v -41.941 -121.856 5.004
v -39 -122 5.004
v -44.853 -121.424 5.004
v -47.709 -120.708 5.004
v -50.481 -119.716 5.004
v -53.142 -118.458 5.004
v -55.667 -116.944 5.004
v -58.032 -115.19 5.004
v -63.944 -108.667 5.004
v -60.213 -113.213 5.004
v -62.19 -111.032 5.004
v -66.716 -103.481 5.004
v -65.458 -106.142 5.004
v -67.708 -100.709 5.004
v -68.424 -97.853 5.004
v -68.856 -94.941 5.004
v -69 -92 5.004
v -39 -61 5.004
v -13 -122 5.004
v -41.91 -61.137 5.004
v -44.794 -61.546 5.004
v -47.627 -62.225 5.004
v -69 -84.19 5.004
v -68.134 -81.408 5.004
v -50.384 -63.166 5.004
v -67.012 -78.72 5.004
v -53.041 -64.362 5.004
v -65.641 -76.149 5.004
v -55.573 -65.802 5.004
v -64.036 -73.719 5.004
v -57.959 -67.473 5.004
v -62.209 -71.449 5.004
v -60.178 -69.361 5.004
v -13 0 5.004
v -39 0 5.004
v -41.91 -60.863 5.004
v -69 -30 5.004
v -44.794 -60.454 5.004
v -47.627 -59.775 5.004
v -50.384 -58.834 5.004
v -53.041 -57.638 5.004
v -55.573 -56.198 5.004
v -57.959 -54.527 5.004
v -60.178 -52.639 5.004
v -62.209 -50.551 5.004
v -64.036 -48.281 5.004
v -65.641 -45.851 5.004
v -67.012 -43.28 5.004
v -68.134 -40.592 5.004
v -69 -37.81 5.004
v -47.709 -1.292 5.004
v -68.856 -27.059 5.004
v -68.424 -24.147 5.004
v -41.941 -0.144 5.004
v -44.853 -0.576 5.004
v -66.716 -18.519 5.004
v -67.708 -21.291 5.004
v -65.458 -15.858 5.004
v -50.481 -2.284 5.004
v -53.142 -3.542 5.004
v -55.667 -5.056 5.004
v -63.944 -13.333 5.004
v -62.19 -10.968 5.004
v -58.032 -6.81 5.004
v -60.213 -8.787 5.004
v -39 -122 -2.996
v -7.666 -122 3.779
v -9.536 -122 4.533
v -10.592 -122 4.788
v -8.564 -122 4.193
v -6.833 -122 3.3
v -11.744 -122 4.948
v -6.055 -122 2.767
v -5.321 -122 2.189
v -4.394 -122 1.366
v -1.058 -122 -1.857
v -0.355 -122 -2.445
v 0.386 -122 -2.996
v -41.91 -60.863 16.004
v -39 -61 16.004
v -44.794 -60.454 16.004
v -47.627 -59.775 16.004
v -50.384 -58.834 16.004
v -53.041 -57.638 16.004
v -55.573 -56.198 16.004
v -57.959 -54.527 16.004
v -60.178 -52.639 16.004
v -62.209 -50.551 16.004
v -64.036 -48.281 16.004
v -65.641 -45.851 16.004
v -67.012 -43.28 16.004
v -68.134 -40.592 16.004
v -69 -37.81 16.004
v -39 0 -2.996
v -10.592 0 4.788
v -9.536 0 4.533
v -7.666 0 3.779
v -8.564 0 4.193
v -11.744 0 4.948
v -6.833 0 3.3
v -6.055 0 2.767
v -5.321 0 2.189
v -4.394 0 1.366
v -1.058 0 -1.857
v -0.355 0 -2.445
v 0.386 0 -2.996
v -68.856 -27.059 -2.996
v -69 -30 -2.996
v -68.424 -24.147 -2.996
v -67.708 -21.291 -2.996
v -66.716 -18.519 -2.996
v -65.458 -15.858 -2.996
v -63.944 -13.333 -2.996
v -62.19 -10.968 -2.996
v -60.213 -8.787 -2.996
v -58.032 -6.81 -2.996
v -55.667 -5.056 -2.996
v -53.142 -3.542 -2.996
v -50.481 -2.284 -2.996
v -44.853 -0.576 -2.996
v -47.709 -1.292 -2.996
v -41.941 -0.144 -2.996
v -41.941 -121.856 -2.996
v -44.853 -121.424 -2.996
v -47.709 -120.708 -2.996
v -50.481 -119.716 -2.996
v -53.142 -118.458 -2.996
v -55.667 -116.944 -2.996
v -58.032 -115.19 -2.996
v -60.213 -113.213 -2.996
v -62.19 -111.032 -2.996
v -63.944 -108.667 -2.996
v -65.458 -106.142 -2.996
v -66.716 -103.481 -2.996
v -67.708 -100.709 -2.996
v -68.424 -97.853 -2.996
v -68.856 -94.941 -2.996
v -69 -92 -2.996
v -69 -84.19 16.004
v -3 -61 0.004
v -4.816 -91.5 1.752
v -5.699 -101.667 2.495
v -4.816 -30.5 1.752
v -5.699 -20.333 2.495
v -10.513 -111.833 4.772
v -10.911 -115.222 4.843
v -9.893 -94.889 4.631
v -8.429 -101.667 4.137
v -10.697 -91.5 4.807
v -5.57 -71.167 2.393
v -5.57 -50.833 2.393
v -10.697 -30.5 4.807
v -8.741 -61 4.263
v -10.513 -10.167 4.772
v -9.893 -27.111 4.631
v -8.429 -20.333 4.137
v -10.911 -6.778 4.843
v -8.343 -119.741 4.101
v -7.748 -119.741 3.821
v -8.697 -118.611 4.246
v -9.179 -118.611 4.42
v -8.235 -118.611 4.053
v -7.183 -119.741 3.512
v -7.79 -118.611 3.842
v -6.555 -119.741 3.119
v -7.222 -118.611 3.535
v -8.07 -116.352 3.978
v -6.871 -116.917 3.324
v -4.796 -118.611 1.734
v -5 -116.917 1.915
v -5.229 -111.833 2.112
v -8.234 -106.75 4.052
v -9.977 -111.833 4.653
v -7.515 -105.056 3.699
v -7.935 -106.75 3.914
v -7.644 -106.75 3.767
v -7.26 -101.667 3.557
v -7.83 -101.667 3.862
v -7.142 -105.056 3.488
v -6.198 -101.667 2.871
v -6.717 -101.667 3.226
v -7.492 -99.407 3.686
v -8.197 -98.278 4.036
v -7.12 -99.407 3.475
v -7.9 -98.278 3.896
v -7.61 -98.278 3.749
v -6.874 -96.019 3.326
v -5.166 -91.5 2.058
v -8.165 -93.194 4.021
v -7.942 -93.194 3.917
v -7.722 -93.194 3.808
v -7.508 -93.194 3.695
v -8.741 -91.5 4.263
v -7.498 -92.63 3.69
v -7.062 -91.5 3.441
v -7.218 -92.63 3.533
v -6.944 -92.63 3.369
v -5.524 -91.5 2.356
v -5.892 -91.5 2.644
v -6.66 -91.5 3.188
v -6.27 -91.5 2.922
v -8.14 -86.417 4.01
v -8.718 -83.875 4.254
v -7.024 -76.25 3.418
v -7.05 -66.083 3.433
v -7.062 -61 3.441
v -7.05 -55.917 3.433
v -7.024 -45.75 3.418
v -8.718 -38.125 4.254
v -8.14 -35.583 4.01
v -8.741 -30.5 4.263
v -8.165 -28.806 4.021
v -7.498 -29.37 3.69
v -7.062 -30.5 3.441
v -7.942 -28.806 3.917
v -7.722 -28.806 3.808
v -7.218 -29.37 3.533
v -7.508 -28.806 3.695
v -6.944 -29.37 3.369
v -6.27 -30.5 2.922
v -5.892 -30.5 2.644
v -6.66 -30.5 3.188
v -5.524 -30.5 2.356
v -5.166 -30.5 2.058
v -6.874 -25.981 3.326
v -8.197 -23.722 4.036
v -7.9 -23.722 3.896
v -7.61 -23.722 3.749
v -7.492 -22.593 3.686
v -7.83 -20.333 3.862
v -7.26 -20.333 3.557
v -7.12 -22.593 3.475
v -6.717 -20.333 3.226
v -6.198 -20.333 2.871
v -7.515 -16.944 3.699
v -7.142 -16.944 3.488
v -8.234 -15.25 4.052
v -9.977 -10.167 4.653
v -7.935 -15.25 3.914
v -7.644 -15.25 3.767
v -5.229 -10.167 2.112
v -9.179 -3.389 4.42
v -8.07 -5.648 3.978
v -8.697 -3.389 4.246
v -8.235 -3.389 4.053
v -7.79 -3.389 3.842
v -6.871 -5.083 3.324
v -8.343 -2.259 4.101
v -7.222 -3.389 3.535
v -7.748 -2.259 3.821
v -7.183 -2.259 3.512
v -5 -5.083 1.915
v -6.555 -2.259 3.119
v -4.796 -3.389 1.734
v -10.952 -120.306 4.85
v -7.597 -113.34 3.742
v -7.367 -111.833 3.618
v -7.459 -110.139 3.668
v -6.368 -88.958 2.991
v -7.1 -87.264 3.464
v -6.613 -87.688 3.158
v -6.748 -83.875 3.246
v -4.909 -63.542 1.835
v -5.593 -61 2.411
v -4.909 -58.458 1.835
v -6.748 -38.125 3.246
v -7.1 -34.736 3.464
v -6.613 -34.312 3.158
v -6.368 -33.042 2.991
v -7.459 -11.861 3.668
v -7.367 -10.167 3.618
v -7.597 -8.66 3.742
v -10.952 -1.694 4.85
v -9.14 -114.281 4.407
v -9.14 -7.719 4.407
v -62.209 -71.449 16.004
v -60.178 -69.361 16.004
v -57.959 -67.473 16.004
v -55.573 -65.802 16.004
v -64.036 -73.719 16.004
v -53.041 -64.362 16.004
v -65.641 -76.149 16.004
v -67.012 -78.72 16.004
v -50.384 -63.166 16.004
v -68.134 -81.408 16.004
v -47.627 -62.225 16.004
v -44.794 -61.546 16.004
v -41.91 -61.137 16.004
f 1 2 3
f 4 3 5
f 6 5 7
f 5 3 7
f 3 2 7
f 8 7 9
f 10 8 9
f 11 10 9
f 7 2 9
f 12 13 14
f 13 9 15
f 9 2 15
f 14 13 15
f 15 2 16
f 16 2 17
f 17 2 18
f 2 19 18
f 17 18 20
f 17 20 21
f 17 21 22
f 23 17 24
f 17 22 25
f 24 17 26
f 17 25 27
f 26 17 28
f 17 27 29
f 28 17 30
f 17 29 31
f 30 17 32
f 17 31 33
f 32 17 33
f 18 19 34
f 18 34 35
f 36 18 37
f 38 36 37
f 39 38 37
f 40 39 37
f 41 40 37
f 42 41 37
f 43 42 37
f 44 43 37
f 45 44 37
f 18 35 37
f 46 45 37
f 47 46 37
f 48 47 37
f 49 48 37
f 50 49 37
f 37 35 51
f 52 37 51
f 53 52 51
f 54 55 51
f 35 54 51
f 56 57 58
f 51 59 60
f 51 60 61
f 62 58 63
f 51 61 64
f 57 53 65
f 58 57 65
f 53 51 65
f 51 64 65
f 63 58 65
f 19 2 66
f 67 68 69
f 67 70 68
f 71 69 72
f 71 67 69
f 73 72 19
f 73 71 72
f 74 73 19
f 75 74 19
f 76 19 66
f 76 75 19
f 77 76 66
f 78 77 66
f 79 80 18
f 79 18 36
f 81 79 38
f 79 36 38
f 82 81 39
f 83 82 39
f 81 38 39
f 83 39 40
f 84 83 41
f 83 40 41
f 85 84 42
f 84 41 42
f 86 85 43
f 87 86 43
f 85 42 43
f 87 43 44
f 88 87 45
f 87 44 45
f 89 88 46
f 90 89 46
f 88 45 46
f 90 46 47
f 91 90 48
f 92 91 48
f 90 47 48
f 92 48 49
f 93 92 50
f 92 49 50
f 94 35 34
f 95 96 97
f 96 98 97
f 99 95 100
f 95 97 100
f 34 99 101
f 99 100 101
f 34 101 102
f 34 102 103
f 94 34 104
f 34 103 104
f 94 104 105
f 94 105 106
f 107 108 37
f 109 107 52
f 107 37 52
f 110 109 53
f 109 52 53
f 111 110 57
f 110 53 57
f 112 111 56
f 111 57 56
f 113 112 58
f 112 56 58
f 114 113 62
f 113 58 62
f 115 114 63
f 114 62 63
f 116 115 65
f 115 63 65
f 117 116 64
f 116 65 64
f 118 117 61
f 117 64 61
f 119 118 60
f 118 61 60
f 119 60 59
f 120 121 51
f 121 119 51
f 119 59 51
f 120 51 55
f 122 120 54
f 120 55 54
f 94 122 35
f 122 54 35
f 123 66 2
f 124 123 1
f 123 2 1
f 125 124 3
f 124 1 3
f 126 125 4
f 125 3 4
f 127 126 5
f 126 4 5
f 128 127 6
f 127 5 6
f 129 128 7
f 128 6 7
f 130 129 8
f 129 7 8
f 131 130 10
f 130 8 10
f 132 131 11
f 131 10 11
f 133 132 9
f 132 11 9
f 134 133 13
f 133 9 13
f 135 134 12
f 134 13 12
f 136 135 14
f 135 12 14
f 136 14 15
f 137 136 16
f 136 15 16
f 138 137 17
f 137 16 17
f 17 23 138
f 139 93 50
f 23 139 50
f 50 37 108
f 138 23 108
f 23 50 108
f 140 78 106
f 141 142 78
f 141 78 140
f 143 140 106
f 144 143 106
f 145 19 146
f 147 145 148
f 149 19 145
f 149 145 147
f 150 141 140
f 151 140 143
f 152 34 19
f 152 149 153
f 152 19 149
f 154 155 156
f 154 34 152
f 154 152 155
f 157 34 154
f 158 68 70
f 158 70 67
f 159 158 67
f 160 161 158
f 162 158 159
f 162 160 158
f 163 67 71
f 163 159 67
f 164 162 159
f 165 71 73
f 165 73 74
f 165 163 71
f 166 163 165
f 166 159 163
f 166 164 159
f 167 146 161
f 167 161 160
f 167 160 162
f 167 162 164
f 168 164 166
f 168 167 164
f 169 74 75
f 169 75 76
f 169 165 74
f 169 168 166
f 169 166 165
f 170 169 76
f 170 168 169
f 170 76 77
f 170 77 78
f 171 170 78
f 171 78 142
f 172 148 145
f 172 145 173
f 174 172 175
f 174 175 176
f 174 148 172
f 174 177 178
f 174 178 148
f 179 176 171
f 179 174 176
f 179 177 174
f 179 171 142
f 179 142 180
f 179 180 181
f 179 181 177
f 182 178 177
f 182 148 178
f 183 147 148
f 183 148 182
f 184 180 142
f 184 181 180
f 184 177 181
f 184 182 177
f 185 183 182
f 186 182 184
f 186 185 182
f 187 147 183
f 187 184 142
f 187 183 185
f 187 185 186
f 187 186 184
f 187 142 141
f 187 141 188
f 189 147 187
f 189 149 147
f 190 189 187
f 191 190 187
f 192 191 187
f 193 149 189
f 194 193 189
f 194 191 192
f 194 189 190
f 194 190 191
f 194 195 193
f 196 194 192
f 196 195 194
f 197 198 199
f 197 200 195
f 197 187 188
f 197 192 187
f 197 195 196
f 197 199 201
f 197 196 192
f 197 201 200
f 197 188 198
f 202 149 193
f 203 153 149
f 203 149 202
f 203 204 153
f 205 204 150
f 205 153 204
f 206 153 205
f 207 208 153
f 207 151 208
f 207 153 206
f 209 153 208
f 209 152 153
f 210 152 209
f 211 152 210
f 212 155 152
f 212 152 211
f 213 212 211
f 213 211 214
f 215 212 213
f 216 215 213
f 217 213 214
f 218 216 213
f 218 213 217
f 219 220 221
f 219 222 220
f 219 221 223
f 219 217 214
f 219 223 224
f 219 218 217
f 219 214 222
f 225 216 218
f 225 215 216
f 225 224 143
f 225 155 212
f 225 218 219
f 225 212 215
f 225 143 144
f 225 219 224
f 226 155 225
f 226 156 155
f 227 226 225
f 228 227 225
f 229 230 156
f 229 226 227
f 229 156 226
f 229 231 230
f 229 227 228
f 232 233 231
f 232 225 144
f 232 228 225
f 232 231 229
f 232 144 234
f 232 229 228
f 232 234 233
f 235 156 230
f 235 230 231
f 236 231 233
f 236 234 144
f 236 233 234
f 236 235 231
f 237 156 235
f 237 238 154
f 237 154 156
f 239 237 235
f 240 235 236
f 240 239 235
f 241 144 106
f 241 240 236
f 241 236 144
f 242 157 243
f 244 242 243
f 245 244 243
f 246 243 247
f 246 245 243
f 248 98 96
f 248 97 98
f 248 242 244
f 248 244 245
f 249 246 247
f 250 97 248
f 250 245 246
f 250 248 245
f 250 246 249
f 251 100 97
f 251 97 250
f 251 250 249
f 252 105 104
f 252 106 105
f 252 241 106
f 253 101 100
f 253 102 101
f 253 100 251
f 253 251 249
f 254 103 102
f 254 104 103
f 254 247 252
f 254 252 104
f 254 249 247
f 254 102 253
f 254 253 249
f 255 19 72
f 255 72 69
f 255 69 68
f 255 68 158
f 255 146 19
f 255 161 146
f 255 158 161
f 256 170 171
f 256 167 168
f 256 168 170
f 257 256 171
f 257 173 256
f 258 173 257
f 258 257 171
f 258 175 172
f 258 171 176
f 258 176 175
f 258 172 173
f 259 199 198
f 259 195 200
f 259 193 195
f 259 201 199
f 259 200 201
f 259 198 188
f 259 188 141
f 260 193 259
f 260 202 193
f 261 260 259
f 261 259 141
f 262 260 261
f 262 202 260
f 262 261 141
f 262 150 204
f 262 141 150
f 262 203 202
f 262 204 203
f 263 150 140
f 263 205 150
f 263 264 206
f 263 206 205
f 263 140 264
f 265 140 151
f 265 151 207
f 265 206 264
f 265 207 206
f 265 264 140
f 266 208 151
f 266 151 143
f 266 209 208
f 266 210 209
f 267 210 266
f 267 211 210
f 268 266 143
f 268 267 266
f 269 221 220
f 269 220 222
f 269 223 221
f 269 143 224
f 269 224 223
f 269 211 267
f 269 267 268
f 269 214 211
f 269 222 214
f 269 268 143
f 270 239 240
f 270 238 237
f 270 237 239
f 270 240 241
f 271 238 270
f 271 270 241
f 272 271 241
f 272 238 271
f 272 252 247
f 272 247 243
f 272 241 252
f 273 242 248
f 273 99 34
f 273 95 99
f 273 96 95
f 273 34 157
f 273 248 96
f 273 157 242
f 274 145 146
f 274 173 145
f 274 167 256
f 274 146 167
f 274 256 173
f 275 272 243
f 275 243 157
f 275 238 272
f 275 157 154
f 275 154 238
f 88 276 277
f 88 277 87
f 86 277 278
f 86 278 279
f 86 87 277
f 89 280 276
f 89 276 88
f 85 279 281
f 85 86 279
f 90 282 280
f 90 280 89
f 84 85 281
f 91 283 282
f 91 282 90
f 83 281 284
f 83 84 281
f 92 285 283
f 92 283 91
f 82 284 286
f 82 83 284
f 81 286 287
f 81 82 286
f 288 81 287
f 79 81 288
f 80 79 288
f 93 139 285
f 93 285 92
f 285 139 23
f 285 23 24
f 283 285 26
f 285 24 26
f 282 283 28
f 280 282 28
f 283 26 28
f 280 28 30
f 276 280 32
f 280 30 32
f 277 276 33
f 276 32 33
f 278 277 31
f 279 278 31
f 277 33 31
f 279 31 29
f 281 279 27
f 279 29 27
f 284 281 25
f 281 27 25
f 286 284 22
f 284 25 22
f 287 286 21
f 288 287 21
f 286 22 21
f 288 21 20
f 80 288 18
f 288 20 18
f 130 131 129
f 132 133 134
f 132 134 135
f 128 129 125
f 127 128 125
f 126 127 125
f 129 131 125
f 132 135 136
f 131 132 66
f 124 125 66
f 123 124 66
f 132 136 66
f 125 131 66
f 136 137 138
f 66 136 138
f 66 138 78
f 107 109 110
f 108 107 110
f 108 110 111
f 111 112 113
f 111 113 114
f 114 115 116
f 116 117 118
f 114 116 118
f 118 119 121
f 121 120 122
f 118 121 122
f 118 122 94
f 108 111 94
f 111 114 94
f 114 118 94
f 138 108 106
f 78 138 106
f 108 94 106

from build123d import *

# Parameters (mm, degrees)
F1_DEPTH = 122
F3_DEPTH = 11
F5_DEPTH = 8.001


with BuildPart() as f1:
    # F0 (on Front) → F1 (new body)
    with BuildSketch(Plane.XZ):
        with BuildLine():
            Line((-13, 5.003651), (-69, 5.003651))
            Line((-69, 5.003651), (-69, -2.996349))
            Line((-69, -2.996349), (0.385778, -2.996349))
            add(Edge.make_bspline(
                [(-13, 5.003651), (-8, 5.003651), (-4.435703, 1.439354), (-0.871407, -2.124942), (0.385778, -2.996349)],
                knots=[0, 0, 0, 0, 11.18034, 15.940018, 15.940018, 15.940018, 15.940018], degree=3))
        make_face()
    extrude(amount=F1_DEPTH)

    # F2 (on face) → F3 (join)
    with BuildSketch(Plane.XY.offset(5.003651)):
        with BuildLine():
            ThreePointArc((-69, -84.18975), (-57.958933, -67.473303), (-39, -61))
            ThreePointArc((-39, -61), (-57.958933, -54.526697), (-69, -37.81025))
            Line((-69, -37.81025), (-69, -84.18975))
        make_face()
    extrude(amount=F3_DEPTH)

    # F4 (on face) → F5 (cut, through all)
    with BuildSketch(Plane.XY.offset(5.003651)):
        with BuildLine():
            ThreePointArc((-39, -122), (-60.213203, -113.213203), (-69, -92))
            Line((-69, -92), (-69, -122))
            Line((-69, -122), (-39, -122))
        make_face()
        with BuildLine():
            Line((-69, 0), (-69, -30))
            ThreePointArc((-69, -30), (-60.213203, -8.786797), (-39, 0))
            Line((-39, 0), (-69, 0))
        make_face()
    extrude(amount=-F5_DEPTH, mode=Mode.SUBTRACT)


solid = f1.part
